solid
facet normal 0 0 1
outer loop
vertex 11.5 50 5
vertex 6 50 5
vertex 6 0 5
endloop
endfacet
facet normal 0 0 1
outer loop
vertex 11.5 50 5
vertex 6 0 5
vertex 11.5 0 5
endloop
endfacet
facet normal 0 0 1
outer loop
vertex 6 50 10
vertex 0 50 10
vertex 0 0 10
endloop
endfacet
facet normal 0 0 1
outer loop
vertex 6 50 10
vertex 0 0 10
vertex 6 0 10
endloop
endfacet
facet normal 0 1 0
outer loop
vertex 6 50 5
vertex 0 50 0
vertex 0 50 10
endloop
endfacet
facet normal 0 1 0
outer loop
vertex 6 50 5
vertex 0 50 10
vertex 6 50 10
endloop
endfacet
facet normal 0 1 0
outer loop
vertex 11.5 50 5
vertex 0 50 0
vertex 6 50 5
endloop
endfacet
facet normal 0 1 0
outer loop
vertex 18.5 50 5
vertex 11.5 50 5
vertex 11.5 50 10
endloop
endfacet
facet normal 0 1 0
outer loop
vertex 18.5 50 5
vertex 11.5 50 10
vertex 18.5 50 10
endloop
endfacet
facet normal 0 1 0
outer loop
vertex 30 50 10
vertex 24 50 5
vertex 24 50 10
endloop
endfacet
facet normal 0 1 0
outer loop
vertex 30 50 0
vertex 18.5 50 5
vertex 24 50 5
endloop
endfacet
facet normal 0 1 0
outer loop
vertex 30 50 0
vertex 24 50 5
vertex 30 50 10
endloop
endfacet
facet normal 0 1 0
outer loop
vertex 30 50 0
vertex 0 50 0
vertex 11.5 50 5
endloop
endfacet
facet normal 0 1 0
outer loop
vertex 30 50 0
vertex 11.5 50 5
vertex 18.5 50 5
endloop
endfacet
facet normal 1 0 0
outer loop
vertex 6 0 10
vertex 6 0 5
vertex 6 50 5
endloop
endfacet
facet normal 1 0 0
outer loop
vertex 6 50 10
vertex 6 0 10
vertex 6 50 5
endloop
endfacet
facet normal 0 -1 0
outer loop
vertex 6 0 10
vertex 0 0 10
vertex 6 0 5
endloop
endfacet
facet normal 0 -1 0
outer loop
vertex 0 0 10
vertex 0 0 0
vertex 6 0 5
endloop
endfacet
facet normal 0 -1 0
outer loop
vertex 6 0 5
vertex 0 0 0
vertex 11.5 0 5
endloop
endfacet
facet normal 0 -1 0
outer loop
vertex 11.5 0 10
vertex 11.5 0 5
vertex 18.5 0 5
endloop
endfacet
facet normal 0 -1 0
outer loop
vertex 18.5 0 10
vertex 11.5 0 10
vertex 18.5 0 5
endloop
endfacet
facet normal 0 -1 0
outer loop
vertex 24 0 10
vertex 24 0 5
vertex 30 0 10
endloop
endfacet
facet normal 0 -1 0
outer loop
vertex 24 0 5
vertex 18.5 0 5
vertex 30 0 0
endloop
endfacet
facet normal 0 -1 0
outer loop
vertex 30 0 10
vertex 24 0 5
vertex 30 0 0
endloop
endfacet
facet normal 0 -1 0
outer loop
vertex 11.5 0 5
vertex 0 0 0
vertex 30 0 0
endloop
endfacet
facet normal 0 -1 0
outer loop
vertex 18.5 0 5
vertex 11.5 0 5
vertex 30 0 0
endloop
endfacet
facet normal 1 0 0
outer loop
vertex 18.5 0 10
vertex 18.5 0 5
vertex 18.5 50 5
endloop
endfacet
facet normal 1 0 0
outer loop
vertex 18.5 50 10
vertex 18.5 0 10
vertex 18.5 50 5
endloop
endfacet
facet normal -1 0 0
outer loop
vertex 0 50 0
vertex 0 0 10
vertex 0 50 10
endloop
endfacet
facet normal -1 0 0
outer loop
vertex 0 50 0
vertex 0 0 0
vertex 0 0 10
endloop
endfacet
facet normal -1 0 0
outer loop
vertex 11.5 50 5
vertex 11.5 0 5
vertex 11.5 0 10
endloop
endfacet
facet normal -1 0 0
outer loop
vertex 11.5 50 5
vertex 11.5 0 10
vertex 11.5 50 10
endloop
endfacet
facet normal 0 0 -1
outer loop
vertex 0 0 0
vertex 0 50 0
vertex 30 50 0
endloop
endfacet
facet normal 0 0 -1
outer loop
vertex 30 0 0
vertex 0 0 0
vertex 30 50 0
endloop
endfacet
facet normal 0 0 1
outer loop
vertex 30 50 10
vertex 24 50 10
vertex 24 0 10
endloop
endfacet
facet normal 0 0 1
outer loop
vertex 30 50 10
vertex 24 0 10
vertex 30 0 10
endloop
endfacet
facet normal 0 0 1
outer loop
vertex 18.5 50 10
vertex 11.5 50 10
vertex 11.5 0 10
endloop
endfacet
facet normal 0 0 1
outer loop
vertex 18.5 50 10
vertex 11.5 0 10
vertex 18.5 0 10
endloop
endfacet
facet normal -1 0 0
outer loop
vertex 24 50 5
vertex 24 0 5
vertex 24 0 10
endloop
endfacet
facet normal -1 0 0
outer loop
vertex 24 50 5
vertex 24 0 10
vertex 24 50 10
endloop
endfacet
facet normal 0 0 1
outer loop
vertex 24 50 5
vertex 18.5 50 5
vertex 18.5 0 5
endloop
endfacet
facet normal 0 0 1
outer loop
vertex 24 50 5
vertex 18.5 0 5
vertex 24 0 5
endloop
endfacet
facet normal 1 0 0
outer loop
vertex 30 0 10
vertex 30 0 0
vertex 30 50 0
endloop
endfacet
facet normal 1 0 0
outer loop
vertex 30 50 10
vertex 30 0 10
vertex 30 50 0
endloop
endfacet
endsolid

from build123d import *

# Parameters (mm, degrees)
F0_W     = 30
F0_H     = 50
F1_DEPTH = 5
F2_W     = 6
F2_H     = 50
F2_W_2   = 7
F3_DEPTH = 5


with BuildPart() as f1:
    # F0 (on Top) → F1 (new body)
    with BuildSketch(Plane.XY):
        with Locations((15, 25)):
            Rectangle(F0_W, F0_H)
    extrude(amount=F1_DEPTH)

    # F2 (on face) → F3 (join)
    with BuildSketch(Plane.XY.offset(5)):
        with Locations((3, 25)):
            Rectangle(F2_W, F2_H)
        with Locations((15, 25)):
            Rectangle(F2_W_2, F2_H)
        with Locations((27, 25)):
            Rectangle(F2_W, F2_H)
    extrude(amount=F3_DEPTH)


solid = f1.part
